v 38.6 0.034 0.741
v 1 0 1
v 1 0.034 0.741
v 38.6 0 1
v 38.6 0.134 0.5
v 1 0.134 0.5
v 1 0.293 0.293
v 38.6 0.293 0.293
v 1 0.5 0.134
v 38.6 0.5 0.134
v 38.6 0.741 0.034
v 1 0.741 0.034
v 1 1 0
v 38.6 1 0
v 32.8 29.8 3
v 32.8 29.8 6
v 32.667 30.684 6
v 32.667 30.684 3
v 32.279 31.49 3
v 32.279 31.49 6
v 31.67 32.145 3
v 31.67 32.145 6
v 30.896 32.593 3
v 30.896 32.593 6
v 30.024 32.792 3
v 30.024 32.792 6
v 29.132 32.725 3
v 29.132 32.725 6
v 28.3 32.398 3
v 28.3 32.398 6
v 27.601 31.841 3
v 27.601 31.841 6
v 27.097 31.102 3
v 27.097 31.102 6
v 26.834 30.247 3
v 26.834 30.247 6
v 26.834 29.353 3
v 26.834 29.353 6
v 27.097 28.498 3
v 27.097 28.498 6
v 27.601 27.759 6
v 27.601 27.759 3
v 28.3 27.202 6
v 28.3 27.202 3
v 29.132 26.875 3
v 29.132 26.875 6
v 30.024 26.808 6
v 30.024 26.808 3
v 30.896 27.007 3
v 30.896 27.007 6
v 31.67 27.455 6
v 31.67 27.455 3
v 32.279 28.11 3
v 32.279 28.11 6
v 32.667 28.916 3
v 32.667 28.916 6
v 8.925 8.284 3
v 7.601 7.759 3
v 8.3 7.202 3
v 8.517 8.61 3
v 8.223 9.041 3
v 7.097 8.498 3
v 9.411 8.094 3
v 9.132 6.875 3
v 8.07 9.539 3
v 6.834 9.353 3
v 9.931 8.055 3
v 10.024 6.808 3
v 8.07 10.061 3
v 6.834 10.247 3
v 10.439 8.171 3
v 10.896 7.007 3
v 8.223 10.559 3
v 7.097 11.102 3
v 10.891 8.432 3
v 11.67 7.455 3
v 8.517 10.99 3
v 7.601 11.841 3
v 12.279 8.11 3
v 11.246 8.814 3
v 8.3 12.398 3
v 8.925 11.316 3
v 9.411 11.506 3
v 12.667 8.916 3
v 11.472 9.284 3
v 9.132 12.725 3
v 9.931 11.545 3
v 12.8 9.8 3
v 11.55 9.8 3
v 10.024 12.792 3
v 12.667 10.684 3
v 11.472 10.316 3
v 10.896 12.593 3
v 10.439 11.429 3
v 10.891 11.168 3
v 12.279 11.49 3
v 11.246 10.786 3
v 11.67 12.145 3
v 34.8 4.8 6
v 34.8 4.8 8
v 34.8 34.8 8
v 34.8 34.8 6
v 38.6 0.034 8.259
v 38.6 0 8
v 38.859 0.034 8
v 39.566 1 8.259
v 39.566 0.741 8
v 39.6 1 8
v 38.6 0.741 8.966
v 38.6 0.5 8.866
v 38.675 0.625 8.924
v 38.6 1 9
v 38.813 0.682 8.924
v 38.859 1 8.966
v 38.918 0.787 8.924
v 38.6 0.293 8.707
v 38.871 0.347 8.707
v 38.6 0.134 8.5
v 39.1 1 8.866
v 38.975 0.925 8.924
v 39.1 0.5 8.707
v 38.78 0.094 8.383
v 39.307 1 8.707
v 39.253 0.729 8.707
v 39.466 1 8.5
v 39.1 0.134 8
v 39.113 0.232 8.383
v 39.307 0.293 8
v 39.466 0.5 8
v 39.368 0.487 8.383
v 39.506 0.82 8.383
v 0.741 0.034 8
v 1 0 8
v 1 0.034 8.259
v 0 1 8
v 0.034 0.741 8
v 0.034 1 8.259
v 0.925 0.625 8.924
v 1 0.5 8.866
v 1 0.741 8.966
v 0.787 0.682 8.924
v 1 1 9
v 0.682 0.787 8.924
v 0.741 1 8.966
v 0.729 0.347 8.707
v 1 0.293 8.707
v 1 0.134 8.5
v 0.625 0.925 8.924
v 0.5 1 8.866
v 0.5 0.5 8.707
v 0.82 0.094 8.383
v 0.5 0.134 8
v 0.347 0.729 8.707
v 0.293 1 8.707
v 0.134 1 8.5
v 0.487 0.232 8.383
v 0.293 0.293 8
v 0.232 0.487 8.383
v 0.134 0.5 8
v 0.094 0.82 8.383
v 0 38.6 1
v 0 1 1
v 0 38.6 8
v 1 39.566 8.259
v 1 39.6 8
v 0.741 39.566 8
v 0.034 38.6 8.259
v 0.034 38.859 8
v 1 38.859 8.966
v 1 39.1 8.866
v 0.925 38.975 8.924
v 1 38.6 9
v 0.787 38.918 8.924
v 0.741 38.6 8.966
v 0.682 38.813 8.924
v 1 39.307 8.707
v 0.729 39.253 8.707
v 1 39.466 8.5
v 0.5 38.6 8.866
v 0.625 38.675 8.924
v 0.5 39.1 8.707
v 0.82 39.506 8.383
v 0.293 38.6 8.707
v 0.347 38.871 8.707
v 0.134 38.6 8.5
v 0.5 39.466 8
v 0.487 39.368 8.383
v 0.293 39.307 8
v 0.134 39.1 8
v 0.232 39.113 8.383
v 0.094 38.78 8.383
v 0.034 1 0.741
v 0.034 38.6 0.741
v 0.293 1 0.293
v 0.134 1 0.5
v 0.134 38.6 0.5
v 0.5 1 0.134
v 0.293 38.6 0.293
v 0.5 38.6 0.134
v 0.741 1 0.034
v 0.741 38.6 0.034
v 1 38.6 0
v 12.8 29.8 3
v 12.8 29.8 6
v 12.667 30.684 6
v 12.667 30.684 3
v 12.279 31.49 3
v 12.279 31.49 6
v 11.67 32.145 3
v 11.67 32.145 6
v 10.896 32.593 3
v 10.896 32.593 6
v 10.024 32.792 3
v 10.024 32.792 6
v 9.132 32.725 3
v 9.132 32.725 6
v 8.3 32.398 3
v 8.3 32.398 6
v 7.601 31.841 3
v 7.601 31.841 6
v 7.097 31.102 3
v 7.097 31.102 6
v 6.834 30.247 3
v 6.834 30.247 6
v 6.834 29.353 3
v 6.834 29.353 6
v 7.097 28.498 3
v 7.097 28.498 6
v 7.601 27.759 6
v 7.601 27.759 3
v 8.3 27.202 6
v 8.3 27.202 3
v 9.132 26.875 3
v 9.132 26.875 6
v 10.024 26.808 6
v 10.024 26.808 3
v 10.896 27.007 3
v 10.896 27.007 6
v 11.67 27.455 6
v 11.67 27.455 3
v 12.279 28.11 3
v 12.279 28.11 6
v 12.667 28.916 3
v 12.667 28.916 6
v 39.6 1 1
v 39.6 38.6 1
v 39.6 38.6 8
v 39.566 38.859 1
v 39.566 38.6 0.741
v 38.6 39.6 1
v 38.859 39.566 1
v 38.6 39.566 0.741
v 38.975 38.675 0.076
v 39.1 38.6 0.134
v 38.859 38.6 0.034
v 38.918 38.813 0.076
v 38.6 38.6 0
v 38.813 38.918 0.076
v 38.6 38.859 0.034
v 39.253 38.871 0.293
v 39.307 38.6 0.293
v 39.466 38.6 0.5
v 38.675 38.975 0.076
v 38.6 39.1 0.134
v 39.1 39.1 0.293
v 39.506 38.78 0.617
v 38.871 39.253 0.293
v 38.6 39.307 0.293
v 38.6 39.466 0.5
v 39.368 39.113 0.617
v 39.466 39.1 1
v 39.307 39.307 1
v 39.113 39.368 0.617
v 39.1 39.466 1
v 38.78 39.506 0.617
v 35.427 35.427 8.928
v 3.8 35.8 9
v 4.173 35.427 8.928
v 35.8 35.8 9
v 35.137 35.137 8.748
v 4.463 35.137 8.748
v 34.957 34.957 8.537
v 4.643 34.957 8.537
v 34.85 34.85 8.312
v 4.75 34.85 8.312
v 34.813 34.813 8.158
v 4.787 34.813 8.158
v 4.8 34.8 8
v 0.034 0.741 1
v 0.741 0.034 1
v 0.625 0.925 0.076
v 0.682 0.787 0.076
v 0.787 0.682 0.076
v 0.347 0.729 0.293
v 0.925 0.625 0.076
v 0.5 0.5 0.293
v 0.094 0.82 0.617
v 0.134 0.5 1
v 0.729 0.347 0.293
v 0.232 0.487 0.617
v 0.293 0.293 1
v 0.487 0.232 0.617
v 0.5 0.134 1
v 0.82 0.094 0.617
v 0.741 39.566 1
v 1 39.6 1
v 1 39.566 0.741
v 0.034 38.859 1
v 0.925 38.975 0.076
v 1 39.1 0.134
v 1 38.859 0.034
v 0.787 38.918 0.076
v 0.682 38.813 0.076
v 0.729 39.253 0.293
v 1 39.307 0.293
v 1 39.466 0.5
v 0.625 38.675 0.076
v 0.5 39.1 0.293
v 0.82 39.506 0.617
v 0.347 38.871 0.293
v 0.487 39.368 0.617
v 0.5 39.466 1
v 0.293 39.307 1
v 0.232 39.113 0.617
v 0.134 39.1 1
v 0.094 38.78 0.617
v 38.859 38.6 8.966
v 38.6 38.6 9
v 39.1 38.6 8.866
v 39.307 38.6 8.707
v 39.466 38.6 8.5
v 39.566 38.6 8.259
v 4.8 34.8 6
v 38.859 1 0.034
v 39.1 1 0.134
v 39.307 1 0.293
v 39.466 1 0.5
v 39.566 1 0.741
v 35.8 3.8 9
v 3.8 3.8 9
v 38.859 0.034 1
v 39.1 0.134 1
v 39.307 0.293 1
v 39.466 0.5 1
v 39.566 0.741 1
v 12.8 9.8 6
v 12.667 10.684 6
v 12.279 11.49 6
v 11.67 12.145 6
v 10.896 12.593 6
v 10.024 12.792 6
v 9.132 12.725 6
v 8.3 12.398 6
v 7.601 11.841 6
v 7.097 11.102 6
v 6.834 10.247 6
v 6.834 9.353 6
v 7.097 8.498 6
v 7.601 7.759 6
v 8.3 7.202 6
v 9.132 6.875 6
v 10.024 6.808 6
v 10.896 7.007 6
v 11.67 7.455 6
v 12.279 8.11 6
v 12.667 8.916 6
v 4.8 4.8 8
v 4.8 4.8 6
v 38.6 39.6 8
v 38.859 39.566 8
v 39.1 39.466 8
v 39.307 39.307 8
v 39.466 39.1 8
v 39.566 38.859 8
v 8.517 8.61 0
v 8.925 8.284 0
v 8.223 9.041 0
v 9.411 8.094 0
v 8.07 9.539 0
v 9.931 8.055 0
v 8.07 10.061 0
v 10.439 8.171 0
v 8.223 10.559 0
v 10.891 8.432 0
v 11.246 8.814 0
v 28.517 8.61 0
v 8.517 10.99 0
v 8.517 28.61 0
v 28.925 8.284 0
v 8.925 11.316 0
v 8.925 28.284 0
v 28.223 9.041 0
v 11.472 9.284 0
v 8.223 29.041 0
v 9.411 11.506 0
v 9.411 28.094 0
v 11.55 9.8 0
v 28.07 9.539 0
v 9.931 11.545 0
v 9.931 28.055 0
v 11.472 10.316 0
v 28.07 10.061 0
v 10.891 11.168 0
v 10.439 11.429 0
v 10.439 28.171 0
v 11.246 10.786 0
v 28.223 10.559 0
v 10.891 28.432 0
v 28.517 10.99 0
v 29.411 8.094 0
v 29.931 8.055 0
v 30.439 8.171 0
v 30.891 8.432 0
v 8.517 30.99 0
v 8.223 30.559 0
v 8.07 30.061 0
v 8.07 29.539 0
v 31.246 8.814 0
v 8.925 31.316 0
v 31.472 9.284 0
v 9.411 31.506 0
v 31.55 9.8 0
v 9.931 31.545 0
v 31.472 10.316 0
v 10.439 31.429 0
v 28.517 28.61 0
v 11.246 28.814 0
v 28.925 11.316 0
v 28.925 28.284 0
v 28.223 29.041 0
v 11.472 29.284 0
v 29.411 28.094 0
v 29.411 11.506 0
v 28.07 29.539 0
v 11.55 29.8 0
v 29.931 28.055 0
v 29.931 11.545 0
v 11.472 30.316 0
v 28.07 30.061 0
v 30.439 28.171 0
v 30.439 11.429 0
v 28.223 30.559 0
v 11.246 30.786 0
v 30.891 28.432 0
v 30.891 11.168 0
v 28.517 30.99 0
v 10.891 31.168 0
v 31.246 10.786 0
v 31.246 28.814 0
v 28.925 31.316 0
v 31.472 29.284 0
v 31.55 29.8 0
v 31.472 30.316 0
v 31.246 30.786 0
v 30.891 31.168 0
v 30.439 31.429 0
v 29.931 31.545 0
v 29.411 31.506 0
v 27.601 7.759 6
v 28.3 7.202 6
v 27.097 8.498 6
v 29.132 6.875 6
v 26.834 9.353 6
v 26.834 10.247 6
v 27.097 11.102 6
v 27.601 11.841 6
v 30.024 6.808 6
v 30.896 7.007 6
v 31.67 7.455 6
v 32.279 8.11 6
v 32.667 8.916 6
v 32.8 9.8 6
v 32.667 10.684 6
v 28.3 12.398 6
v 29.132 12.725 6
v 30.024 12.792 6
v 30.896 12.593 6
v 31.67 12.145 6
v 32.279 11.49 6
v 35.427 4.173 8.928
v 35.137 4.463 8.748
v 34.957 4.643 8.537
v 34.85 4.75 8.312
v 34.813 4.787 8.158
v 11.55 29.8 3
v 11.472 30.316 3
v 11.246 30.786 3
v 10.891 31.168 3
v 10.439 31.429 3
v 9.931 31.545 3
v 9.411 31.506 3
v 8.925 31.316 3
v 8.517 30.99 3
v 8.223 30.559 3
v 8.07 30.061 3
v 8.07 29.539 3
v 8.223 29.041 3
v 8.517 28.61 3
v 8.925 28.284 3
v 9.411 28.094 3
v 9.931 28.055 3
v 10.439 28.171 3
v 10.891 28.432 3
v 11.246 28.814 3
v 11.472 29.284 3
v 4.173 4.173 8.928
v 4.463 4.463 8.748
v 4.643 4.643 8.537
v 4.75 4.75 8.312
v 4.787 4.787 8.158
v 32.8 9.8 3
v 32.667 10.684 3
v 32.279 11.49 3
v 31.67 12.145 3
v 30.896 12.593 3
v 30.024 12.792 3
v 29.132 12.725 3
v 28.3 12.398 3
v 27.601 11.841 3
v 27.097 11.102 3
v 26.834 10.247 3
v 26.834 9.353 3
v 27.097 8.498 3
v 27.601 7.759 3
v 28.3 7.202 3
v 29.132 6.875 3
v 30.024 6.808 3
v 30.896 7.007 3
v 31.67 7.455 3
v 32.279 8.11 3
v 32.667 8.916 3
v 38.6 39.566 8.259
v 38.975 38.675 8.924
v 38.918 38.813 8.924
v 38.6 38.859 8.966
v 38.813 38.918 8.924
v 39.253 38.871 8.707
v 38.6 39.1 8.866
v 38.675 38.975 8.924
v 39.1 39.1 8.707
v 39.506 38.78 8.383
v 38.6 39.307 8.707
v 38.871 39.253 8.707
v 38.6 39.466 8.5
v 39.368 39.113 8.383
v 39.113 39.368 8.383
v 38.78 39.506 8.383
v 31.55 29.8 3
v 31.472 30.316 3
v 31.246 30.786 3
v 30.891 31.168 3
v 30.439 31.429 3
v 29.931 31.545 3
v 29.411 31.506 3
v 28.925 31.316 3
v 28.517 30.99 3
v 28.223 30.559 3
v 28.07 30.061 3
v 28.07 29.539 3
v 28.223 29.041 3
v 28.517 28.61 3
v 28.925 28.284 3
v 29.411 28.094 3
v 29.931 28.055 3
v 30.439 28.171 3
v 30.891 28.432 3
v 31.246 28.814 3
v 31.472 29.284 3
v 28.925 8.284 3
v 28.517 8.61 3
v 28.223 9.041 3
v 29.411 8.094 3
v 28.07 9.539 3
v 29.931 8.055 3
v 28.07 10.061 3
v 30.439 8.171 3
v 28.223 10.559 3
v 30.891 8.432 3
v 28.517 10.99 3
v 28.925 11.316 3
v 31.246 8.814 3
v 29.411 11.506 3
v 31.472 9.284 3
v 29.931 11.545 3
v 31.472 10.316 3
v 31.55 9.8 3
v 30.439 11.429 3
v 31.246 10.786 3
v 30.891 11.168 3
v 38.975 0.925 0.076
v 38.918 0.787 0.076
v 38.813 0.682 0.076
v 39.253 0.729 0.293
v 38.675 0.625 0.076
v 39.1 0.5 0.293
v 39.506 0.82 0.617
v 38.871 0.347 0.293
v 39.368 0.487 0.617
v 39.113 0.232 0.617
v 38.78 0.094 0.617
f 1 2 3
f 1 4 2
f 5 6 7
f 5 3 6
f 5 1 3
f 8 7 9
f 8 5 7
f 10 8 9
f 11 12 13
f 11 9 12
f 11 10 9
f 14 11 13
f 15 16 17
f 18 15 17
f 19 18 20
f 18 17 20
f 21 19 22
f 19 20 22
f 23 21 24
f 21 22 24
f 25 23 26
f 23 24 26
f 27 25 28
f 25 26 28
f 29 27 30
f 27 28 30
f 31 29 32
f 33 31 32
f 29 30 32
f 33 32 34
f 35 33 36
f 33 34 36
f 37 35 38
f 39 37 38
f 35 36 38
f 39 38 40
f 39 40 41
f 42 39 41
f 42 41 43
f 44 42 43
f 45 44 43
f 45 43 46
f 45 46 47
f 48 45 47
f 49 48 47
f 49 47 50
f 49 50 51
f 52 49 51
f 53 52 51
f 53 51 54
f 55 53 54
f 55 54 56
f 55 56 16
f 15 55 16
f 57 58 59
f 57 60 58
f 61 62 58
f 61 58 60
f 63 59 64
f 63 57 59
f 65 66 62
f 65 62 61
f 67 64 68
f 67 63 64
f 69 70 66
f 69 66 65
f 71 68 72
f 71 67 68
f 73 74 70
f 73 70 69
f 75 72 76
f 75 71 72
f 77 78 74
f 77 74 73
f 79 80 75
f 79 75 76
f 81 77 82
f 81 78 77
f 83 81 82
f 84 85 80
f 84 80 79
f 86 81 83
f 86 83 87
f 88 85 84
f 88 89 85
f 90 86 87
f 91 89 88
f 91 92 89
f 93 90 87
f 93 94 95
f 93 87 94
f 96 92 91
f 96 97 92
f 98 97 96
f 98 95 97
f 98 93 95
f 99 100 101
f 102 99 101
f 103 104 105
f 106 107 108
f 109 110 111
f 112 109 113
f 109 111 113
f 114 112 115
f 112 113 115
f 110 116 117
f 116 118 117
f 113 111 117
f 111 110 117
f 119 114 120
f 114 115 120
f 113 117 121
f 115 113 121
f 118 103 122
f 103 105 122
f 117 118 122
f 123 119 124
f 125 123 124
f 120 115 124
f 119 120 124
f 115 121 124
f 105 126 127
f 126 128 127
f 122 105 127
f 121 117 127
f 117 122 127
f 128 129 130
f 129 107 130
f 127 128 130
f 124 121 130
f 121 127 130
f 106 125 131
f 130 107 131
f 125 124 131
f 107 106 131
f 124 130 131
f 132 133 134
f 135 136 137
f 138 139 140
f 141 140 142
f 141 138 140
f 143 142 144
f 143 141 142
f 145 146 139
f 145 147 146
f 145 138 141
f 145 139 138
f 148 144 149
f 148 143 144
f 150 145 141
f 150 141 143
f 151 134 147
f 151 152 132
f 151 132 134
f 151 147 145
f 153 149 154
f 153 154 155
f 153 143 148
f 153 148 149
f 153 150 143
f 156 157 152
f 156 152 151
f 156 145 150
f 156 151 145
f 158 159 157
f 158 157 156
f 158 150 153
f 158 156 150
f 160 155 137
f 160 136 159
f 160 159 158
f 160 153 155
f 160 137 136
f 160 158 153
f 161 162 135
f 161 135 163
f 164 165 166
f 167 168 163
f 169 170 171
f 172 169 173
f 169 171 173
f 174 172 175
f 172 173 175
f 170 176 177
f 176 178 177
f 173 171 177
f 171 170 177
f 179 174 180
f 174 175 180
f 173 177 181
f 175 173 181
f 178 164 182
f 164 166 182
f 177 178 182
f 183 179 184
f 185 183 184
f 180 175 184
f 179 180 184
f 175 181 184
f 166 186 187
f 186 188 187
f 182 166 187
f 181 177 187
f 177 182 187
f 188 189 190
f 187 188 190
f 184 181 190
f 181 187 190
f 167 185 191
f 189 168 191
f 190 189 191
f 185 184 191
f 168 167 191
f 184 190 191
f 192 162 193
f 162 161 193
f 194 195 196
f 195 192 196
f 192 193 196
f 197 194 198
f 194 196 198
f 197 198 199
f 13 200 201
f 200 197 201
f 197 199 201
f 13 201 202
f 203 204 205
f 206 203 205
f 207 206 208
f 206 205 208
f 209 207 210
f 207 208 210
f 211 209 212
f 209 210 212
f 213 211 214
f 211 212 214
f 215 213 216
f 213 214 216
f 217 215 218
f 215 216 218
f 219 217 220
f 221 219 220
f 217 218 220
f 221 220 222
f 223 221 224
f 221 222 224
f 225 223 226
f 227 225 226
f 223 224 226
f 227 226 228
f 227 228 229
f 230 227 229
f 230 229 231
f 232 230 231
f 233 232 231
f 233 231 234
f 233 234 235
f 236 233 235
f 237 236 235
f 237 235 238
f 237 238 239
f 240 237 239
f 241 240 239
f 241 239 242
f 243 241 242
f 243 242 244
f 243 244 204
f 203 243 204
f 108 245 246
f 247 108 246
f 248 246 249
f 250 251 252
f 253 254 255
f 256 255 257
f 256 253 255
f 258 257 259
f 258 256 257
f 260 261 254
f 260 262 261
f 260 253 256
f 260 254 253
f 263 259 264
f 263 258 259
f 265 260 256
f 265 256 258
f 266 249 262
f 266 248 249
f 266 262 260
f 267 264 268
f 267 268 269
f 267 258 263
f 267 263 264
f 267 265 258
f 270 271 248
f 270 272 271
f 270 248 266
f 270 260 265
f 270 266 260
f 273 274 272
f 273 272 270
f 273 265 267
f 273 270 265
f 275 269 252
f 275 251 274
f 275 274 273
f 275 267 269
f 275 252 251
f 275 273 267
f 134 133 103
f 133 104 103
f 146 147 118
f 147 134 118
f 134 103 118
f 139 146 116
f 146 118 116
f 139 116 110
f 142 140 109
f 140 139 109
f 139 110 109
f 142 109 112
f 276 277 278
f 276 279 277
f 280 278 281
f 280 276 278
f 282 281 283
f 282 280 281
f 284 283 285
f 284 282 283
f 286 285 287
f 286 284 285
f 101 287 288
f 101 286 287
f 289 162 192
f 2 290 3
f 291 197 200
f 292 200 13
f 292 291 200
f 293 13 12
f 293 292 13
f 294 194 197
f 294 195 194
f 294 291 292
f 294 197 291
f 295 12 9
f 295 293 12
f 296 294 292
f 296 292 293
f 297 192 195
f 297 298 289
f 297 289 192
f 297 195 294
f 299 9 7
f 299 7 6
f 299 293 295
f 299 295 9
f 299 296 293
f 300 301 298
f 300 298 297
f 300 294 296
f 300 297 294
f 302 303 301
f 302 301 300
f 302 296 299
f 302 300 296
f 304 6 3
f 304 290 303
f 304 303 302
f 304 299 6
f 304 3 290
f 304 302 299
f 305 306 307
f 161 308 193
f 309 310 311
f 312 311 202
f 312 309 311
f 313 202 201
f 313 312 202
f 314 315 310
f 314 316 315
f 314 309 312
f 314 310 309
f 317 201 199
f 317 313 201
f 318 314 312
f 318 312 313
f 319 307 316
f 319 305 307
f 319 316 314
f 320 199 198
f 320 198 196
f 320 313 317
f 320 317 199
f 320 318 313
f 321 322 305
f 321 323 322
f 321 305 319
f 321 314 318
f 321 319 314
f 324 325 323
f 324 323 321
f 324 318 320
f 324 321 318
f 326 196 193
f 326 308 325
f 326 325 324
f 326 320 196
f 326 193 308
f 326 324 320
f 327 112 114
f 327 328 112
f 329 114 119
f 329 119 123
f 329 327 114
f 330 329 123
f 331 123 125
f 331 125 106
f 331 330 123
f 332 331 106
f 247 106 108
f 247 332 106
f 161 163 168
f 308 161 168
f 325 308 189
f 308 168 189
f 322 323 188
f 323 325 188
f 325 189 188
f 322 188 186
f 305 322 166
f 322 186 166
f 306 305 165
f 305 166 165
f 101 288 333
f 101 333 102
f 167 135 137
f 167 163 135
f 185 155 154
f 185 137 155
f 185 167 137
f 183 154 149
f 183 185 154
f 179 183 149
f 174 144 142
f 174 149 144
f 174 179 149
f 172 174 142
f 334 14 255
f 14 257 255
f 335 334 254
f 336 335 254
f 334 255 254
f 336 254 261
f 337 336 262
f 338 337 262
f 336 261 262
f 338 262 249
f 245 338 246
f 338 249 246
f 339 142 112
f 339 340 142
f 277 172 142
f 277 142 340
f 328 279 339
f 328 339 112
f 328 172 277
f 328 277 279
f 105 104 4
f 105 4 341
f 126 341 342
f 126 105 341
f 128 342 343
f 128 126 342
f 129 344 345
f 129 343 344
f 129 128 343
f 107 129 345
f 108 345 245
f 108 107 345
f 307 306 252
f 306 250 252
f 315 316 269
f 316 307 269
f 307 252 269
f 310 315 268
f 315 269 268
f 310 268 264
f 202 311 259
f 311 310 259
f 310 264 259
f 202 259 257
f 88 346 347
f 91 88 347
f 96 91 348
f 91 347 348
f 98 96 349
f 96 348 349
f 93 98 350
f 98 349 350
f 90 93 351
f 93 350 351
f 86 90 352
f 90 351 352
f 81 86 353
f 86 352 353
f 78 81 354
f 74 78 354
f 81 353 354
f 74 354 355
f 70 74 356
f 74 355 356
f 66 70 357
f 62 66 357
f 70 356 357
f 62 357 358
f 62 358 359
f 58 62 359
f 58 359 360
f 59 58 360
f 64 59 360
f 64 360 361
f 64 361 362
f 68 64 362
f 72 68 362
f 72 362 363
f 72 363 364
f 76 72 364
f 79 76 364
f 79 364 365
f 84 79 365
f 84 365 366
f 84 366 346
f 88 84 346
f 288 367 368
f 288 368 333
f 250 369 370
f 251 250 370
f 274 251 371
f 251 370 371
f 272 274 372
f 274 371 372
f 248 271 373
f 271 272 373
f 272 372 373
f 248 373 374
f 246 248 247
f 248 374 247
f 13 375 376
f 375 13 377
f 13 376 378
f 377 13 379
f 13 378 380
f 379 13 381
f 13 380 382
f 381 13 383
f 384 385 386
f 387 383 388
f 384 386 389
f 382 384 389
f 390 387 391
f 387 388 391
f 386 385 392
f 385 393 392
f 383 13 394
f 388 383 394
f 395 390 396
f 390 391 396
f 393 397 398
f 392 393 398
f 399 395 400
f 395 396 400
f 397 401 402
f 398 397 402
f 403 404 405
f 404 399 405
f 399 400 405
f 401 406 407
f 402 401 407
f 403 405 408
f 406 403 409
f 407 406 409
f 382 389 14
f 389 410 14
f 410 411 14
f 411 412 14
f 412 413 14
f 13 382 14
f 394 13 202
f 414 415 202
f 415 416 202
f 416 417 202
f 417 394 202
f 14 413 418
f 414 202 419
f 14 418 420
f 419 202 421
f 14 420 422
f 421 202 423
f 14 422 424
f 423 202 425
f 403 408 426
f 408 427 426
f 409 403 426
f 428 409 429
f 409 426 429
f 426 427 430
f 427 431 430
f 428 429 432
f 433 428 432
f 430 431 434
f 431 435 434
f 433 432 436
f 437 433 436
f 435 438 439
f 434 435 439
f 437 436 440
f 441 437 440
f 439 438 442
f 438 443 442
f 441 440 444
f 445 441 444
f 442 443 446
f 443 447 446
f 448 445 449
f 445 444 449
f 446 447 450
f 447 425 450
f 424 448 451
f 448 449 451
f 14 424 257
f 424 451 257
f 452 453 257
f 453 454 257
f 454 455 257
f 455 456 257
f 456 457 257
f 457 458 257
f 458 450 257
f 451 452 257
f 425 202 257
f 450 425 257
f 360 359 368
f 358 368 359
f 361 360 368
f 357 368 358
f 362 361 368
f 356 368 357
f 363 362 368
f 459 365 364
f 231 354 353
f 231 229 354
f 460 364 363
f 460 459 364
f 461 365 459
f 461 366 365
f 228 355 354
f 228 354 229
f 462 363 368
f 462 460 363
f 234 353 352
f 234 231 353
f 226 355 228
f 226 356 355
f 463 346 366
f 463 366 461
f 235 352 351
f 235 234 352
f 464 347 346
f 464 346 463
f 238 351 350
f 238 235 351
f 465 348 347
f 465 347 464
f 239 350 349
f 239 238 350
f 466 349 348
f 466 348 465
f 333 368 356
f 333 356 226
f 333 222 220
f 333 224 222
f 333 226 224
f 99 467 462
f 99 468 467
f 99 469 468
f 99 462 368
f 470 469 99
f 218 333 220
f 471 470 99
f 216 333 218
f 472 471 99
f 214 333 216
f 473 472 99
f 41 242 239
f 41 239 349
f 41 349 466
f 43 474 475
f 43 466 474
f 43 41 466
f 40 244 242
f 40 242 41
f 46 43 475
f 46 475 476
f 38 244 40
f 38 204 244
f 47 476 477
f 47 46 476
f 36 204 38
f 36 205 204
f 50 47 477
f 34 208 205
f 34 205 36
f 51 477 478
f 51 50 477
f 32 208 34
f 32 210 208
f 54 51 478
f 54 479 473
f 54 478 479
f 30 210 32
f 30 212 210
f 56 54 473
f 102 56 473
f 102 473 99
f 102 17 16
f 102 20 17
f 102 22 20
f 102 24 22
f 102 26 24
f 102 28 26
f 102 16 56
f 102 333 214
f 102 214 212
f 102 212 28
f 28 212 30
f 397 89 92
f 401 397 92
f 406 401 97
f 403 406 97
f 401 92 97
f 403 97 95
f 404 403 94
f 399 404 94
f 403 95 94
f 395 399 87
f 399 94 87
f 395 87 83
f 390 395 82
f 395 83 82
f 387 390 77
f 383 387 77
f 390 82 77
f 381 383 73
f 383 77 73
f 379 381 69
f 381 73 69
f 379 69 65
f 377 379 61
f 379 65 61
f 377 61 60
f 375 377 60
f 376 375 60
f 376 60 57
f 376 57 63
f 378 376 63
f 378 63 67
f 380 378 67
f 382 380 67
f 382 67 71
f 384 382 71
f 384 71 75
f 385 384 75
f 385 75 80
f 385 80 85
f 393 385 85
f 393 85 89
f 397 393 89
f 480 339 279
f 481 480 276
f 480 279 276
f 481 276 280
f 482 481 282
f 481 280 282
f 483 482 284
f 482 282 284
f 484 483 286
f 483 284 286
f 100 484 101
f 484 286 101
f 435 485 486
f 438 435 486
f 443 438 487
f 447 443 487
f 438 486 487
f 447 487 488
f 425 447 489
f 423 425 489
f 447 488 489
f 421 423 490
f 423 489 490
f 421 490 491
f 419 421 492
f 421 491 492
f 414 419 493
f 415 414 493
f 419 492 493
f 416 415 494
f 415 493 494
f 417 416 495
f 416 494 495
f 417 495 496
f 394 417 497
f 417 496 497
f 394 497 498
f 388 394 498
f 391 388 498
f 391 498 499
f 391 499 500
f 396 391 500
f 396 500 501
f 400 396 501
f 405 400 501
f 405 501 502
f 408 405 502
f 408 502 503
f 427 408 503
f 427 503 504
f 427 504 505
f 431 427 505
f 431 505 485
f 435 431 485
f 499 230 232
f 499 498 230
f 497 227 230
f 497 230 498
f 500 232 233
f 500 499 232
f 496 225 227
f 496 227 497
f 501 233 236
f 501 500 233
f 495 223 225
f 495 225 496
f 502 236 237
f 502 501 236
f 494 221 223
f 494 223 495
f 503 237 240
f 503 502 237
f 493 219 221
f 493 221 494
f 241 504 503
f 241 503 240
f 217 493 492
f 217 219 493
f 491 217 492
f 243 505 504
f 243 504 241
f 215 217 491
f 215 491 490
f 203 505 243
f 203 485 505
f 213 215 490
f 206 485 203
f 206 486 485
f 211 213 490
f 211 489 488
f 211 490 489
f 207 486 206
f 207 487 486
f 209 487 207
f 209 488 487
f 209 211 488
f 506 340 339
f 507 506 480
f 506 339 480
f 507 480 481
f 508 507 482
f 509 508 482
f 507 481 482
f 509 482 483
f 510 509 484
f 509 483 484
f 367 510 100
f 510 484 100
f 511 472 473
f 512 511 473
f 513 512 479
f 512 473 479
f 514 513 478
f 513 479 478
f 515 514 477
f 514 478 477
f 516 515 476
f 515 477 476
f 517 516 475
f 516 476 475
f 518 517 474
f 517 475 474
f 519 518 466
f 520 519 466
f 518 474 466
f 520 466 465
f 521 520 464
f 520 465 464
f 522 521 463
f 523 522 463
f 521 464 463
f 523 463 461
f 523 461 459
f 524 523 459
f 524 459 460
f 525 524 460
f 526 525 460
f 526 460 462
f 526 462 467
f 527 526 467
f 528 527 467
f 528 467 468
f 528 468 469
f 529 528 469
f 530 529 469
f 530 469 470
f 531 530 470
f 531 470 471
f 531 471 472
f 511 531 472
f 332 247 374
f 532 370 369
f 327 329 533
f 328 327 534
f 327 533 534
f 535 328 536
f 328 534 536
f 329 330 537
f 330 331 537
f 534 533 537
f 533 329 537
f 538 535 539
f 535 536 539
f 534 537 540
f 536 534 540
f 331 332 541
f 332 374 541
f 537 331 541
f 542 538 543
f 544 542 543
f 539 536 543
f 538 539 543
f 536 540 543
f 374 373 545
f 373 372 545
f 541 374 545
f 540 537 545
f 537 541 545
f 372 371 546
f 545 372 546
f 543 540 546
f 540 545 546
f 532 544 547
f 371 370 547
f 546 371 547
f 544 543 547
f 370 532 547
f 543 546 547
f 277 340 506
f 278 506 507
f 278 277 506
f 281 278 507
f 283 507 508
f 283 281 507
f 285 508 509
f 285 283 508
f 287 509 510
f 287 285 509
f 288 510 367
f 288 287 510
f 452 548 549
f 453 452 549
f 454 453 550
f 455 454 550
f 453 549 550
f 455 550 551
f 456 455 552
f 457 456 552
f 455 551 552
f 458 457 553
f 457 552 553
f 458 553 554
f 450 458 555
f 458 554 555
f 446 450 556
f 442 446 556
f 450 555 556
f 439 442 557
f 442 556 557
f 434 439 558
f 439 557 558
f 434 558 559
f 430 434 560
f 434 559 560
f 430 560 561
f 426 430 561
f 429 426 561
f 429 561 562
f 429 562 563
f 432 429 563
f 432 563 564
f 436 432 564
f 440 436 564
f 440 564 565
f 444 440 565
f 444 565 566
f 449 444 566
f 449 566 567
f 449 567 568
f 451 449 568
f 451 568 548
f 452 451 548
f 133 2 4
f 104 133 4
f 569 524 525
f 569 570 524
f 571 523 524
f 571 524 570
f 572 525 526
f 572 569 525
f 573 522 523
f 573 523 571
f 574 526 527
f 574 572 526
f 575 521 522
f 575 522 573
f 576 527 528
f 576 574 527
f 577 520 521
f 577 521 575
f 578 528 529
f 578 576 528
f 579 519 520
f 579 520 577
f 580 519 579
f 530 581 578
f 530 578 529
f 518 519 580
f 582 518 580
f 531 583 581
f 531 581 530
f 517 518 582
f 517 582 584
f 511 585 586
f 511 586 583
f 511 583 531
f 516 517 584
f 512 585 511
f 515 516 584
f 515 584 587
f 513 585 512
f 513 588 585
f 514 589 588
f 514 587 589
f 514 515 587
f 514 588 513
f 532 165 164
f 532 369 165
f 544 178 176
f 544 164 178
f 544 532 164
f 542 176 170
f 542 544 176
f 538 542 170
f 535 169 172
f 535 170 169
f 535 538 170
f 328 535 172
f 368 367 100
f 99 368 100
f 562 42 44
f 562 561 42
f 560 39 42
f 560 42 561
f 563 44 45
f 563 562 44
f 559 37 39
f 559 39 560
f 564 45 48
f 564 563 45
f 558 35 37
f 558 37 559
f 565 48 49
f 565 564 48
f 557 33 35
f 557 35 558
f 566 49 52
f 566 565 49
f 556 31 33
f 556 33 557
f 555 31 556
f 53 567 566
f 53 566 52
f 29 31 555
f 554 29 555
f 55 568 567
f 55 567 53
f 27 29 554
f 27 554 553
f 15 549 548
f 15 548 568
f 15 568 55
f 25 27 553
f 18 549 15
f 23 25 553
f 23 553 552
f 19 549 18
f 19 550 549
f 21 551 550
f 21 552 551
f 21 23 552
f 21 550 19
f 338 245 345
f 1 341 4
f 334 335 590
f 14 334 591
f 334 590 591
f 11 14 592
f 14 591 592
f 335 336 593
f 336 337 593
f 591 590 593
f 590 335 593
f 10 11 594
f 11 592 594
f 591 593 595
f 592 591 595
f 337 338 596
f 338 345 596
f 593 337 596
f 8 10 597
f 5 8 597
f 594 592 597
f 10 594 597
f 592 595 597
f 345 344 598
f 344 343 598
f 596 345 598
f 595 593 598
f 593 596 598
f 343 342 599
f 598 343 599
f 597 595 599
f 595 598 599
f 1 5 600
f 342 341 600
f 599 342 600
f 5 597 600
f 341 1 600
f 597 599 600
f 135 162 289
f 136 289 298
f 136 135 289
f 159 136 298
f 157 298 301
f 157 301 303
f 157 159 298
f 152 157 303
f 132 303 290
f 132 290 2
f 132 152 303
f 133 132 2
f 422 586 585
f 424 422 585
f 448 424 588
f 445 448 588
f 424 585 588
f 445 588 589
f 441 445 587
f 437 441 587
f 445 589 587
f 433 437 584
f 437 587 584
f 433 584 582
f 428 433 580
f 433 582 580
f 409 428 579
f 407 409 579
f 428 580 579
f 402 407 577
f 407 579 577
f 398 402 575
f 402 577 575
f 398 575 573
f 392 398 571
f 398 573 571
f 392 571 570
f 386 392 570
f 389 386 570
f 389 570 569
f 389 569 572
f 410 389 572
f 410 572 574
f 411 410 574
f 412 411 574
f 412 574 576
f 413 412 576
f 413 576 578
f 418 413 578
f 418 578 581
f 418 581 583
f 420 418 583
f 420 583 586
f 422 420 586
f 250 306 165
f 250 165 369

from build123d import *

# Parameters (mm, degrees)
SKETCH_W        = 39.6
SKETCH_H        = 39.6
PAD_DEPTH       = 9
SKETCH001_R     = 1.75
POCKET_DEPTH    = 10
SKETCH002_R     = 3
POCKET001_DEPTH = 6
SKETCH003_W     = 30
SKETCH003_H     = 30
POCKET002_DEPTH = 3
FILLET_R        = 1


with BuildPart() as part:
    # Sketch → Pad (new body)
    with BuildSketch(Plane.XY):
        with Locations((19.8, 19.8)):
            Rectangle(SKETCH_W, SKETCH_H)
    extrude(amount=PAD_DEPTH)

    # Sketch001 → Pocket (cut)
    with BuildSketch(Plane.XY.offset(9)):
        with Locations((9.8, 9.8)):
            Circle(SKETCH001_R)
        with Locations((9.8, 29.8)):
            Circle(SKETCH001_R)
        with Locations((29.8, 9.8)):
            Circle(SKETCH001_R)
        with Locations((29.8, 29.8)):
            Circle(SKETCH001_R)
    extrude(amount=-POCKET_DEPTH, mode=Mode.SUBTRACT)

    # Sketch002 → Pocket001 (cut)
    with BuildSketch(Plane.XY.offset(9)):
        with Locations((9.8, 9.8)):
            Circle(SKETCH002_R)
        with Locations((9.8, 29.8)):
            Circle(SKETCH002_R)
        with Locations((29.8, 9.8)):
            Circle(SKETCH002_R)
        with Locations((29.8, 29.8)):
            Circle(SKETCH002_R)
    extrude(amount=-POCKET001_DEPTH, mode=Mode.SUBTRACT)

    # Sketch003 → Pocket002 (cut)
    with BuildSketch(Plane.XY.offset(9)):
        with Locations((19.8, 19.8)):
            Rectangle(SKETCH003_W, SKETCH003_H)
    extrude(amount=-POCKET002_DEPTH, mode=Mode.SUBTRACT)

    # Fillet
    fillet_edges = [part.edges().sort_by_distance(p)[0] for p in [
        (0, 39.6, 4.5),
        (0, 0, 4.5),
        (39.6, 39.6, 4.5),
        (39.6, 0, 4.5),
        (39.6, 19.8, 0),
        (19.8, 39.6, 0),
        (0, 19.8, 0),
        (19.8, 0, 0),
        (19.8, 0, 9),
        (39.6, 19.8, 9),
        (19.8, 39.6, 9),
        (0, 19.8, 9),
        (19.8, 4.8, 9),
        (34.8, 19.8, 9),
        (19.8, 34.8, 9),
        (4.8, 19.8, 9),
    ]]
    fillet(fillet_edges, radius=FILLET_R)


solid = part.part
